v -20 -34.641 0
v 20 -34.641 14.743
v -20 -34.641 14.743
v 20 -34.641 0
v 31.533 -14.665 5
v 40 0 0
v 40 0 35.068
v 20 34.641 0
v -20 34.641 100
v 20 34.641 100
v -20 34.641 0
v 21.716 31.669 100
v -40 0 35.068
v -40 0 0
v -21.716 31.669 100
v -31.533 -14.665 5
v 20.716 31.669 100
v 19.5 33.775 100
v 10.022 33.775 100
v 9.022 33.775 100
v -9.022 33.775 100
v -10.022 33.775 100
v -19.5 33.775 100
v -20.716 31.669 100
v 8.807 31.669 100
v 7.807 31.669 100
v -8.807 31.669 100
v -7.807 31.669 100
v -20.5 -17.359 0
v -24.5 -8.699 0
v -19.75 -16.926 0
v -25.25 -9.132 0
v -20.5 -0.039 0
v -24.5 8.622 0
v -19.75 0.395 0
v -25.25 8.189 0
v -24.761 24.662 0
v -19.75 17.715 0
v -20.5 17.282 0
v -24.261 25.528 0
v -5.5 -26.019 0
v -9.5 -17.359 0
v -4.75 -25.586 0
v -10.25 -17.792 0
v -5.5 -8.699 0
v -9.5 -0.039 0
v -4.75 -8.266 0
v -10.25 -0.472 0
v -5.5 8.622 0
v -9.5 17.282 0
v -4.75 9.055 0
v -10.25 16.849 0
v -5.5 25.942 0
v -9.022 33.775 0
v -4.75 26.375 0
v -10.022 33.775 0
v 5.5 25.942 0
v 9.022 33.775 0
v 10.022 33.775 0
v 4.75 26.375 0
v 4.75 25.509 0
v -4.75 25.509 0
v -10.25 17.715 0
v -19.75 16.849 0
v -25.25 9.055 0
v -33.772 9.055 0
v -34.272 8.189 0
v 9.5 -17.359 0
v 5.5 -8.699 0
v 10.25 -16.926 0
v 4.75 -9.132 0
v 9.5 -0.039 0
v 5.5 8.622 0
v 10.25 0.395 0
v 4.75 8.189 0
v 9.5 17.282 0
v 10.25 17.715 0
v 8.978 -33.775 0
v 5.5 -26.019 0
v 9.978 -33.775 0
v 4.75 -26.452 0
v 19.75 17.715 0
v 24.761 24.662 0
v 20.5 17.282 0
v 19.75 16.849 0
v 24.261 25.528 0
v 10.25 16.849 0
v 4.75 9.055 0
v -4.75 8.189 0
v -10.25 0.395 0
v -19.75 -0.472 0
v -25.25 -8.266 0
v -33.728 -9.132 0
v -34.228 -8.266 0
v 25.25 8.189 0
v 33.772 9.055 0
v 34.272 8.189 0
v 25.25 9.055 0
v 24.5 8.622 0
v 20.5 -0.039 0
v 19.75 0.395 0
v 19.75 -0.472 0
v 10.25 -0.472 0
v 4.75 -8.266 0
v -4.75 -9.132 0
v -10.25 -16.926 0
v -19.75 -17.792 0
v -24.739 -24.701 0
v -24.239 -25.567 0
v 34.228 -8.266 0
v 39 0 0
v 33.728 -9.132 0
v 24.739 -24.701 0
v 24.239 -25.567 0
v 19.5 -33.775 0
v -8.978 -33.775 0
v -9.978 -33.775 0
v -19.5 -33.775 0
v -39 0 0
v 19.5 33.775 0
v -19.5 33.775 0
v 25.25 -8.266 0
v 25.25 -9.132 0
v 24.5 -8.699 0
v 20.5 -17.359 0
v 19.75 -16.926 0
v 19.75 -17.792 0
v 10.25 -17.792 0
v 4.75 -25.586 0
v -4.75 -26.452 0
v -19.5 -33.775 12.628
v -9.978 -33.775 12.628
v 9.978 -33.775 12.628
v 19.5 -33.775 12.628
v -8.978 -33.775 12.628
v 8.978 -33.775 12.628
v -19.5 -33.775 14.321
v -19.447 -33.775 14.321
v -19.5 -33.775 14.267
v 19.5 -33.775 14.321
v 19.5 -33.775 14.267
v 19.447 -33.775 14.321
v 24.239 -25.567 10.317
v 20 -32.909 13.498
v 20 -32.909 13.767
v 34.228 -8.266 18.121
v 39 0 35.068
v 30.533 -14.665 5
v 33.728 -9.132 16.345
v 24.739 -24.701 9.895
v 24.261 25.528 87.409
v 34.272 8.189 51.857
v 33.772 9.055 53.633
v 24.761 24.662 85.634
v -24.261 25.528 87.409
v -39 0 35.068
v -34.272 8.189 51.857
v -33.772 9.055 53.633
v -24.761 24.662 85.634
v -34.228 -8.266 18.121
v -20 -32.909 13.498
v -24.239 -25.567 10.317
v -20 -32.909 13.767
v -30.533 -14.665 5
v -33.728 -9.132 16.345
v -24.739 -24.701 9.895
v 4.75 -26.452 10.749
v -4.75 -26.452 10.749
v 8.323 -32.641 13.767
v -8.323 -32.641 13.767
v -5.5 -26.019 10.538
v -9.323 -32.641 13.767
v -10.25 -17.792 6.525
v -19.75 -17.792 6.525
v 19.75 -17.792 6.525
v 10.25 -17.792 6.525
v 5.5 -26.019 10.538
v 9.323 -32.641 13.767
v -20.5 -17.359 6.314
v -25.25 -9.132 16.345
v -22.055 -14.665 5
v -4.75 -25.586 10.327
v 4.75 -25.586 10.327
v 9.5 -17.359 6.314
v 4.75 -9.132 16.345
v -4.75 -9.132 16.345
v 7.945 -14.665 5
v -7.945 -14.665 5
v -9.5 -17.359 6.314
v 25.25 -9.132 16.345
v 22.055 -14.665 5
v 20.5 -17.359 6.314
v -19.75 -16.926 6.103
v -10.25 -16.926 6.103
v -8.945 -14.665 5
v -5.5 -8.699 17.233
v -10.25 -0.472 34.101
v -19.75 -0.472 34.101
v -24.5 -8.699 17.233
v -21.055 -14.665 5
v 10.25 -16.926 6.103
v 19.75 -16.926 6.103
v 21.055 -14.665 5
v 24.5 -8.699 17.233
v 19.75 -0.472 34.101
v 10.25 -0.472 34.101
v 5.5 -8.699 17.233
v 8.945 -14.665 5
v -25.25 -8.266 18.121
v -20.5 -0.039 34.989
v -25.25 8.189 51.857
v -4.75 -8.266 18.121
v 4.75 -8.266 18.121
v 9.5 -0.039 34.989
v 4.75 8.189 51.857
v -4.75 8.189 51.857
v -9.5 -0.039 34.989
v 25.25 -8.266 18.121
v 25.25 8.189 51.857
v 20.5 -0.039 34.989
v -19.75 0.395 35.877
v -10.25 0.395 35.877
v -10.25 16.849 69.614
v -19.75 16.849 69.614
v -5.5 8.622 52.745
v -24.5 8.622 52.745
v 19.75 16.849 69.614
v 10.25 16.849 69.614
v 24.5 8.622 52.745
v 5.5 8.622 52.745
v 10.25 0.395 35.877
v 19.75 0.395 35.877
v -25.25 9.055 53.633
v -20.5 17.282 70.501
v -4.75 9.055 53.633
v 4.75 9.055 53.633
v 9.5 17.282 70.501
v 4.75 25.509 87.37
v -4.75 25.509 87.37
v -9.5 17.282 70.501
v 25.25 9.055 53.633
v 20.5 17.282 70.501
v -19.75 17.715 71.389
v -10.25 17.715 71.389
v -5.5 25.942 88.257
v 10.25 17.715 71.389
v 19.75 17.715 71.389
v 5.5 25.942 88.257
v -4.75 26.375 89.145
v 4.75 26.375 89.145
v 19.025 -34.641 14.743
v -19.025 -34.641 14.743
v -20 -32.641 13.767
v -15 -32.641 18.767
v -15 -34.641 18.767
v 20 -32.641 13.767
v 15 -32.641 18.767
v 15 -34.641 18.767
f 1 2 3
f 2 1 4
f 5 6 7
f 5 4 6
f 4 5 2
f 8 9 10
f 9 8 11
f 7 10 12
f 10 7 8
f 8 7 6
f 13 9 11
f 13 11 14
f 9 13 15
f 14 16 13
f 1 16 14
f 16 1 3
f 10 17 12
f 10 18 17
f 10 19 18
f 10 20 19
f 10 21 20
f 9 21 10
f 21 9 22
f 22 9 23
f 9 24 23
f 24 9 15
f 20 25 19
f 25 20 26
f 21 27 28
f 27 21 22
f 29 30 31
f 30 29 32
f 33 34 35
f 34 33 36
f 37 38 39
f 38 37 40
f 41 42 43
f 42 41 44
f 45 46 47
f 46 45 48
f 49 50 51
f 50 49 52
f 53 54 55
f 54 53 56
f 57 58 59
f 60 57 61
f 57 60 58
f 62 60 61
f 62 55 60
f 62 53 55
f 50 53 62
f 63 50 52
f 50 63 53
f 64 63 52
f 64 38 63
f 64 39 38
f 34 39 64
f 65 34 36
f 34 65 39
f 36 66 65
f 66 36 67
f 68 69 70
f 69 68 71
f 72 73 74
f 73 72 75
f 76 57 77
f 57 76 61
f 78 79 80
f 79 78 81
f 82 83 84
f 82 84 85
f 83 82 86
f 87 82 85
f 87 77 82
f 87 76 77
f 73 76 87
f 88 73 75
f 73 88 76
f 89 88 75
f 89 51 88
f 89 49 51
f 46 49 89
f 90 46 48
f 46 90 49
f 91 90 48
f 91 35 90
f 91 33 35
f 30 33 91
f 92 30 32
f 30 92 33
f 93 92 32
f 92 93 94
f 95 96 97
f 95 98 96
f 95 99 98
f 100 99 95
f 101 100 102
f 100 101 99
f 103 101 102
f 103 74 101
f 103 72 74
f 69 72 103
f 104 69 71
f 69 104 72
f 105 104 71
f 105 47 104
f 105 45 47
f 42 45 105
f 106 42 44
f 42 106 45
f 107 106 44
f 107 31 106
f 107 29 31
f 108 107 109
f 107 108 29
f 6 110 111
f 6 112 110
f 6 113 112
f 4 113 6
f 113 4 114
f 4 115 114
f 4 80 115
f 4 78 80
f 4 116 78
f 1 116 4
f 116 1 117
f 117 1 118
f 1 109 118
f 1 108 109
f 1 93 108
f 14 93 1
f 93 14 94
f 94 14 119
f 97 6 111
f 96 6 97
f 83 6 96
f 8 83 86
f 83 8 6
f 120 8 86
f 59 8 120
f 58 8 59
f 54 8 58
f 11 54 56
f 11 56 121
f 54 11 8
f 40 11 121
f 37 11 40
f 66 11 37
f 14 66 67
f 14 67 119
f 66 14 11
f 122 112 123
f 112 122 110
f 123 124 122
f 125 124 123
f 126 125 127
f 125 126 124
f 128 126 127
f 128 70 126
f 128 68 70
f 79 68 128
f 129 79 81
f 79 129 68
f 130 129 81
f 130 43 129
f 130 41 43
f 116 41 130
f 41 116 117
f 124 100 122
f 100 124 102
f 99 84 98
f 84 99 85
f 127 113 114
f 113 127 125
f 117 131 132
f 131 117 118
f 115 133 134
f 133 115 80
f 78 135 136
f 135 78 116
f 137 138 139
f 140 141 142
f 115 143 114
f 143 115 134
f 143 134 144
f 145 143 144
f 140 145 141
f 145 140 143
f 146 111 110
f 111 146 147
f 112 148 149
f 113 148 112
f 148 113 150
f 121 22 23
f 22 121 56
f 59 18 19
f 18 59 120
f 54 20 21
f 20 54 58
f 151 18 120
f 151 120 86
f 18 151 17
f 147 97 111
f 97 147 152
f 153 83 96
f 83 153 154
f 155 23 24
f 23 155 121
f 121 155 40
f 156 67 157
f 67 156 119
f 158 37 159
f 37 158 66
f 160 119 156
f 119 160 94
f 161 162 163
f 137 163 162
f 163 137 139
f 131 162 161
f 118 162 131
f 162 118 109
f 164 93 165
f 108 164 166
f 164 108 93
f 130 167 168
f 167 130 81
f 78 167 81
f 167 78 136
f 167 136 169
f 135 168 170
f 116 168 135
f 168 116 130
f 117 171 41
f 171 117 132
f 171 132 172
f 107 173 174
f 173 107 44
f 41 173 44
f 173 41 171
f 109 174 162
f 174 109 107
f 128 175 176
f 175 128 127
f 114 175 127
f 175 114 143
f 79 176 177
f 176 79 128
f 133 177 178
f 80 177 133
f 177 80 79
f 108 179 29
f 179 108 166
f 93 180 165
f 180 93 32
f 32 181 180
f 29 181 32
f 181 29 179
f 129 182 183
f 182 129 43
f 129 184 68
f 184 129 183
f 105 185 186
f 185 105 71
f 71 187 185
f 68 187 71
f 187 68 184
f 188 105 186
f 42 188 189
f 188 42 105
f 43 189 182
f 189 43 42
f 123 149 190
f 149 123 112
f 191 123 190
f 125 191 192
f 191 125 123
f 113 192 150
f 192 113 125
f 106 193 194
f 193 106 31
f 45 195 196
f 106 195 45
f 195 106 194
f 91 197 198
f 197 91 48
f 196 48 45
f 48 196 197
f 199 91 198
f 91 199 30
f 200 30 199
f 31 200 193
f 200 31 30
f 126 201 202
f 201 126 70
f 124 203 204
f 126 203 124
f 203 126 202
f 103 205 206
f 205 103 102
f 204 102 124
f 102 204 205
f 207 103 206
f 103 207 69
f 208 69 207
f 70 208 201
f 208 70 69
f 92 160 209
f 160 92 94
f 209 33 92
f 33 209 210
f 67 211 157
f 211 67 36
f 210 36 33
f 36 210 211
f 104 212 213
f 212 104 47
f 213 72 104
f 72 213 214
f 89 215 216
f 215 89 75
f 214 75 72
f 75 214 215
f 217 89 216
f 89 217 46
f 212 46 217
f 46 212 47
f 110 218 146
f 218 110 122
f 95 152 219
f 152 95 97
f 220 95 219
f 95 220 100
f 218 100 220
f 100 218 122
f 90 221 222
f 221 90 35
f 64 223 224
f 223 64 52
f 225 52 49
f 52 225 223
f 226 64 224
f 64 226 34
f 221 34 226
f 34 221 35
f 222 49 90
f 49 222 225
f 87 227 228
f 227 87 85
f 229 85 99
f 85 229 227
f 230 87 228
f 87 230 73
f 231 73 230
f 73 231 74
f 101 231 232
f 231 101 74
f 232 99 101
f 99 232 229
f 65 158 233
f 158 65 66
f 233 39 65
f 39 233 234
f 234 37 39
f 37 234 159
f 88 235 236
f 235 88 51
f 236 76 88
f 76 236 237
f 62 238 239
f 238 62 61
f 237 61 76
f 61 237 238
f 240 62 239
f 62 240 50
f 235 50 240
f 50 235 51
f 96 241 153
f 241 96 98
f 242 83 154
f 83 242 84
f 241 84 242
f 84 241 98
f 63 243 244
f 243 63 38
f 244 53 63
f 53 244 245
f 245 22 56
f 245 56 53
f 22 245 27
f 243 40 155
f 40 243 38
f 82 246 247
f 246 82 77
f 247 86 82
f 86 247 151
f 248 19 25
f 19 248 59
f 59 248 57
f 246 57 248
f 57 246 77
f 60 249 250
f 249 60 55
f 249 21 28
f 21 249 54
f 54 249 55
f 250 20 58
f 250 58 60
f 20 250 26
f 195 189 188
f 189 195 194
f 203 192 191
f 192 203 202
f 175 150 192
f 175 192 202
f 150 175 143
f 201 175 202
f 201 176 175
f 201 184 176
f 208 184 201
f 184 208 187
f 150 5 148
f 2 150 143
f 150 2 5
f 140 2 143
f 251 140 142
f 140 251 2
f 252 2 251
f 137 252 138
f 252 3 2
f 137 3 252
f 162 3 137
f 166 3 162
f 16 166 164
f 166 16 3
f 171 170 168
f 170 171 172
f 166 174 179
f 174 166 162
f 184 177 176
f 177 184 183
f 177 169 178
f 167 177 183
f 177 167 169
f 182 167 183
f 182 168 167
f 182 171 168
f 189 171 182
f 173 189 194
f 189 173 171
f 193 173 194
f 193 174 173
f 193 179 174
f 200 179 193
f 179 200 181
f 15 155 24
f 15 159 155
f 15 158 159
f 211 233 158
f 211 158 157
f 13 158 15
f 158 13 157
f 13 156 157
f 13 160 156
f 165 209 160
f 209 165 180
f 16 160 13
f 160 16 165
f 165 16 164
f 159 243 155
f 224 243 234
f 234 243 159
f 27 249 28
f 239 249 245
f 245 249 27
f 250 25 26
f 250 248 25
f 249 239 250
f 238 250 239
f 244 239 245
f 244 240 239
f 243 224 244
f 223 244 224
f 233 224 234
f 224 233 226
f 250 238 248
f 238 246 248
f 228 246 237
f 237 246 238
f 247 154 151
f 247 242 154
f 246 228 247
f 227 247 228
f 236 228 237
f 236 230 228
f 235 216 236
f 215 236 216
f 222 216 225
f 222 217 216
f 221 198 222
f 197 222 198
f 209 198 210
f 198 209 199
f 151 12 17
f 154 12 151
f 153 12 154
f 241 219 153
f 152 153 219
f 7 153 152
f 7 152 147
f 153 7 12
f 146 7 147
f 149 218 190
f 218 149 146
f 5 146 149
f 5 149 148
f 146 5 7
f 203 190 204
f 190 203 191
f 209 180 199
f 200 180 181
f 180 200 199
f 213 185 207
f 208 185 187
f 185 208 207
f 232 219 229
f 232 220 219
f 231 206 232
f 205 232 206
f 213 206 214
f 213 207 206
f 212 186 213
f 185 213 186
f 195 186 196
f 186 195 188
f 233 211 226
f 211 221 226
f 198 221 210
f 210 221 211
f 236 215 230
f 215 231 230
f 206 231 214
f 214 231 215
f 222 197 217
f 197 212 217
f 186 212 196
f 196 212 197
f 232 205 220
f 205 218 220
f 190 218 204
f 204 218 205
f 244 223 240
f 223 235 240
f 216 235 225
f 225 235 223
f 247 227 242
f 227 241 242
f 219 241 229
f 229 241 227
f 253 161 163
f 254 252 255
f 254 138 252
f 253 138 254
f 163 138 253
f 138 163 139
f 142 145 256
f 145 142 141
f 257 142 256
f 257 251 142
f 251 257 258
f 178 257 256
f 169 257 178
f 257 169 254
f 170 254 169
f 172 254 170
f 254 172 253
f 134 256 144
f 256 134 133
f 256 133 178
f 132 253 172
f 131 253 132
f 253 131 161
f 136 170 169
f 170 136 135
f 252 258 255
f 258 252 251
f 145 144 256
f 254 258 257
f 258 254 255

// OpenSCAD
// -----------------------------------------------------
// Smartphone-HalterungV4
//
//  Detlev Ahlgrimm, 11.2018
// -----------------------------------------------------

/* [Main parameters] */
outer_radius=40;        // [20:60]
height=100;             // [50:150]
wall_thickness=1;       // [0.5:0.1:4]
angle=26;               // [0:40]
smartphone_deepth=20;   // [5:40]

/* [Hex-Grid parameters] */
start_x=20;             // [0:0.1:40]
start_y=12;             // [0:0.1:40]
radius=10;              // [3:30]
width=1;                // [0.2:0.05:2]

/* [Hidden] */
$fn=100;
c=smartphone_deepth;
a=c*cos(angle);
b=sqrt(c*c-a*a);


// -----------------------------------------------------
//    v : Abmessungs-Vektor
//    r : Radius der Aussparungen
//    w : Wandstaerke zwischen den Aussparungen
//    i : invertieren (true:Sechseck-Umrandungen, false:Sechsecke)
//    a : anschraegen 45 Grad (bei true)
// -----------------------------------------------------
module HexPatternV2(v, r=10, w=1, i=true, a=false) {
  dx=r*1.5;
  dy=r*0.866025;      // 0.866025=sqrt(3)/2
  sy=(i) ? -0.1 : 0;
  az=(i) ? 0.2 : 0;
  r1=(a) ? r-w/2-(v.z+0.2) : r-w/2;

  intersection() {
    difference() {
      if(i) cube(v);
      for(yi=[0:1:v.y/dy+1]) {
        for(xi=[0:1:v.x/(2*dx)+1]) {
          if((yi%2)==1) {
            translate([xi*2*dx+dx, yi*dy, sy]) cylinder(r1=r1, r2=r-w/2, h=v.z+az, $fn=6);
          } else {
            translate([xi*2*dx, yi*dy, sy]) cylinder(r1=r1, r2=r-w/2, h=v.z+az, $fn=6);
          }
        }
      }
    }
    if(!i) cube(v);
  }
}


union() {
  difference() {
    union() {
      difference() {        // aeussere Wand
        cylinder(r=outer_radius, height, $fn=6);
        translate([0, 0, -0.1]) cylinder(r=outer_radius-wall_thickness, height+0.2, $fn=6);
      }
      intersection() {      // Hex-Pattern
        translate([-outer_radius-start_x, -outer_radius-start_y, 0]) HexPatternV2([200, 200, height], radius, width);
        cylinder(r=outer_radius, height, $fn=6);
      }
    }
    // Platz fuer Smartphone schaffen
    translate([-outer_radius-1, -outer_radius*0.866025+2+a, 5]) rotate([-angle, 0, 0]) translate([0, -2*outer_radius, 0]) cube([2*outer_radius+2, 2*outer_radius, 2*height]);
  }
  // Anti-Wegrutsch-Steg
  translate([-outer_radius*0.5, -outer_radius*0.866025+2, 5+b]) rotate([90, 0, 0]) hull() {
    linear_extrude(2) polygon([[0,0], [outer_radius,0], [outer_radius-5,5], [5,5]]);
    translate([0, -2, 1.99]) cube([outer_radius, 2, 0.01]);
  }
}

// Smartphone-Muster draufsetzen
//%translate([-outer_radius-1, -outer_radius*0.866025+2+a, 5]) rotate([-angle, 0, 0]) translate([0, -smartphone_deepth, 0]) cube([2*outer_radius+2, smartphone_deepth, height*1.5]);
